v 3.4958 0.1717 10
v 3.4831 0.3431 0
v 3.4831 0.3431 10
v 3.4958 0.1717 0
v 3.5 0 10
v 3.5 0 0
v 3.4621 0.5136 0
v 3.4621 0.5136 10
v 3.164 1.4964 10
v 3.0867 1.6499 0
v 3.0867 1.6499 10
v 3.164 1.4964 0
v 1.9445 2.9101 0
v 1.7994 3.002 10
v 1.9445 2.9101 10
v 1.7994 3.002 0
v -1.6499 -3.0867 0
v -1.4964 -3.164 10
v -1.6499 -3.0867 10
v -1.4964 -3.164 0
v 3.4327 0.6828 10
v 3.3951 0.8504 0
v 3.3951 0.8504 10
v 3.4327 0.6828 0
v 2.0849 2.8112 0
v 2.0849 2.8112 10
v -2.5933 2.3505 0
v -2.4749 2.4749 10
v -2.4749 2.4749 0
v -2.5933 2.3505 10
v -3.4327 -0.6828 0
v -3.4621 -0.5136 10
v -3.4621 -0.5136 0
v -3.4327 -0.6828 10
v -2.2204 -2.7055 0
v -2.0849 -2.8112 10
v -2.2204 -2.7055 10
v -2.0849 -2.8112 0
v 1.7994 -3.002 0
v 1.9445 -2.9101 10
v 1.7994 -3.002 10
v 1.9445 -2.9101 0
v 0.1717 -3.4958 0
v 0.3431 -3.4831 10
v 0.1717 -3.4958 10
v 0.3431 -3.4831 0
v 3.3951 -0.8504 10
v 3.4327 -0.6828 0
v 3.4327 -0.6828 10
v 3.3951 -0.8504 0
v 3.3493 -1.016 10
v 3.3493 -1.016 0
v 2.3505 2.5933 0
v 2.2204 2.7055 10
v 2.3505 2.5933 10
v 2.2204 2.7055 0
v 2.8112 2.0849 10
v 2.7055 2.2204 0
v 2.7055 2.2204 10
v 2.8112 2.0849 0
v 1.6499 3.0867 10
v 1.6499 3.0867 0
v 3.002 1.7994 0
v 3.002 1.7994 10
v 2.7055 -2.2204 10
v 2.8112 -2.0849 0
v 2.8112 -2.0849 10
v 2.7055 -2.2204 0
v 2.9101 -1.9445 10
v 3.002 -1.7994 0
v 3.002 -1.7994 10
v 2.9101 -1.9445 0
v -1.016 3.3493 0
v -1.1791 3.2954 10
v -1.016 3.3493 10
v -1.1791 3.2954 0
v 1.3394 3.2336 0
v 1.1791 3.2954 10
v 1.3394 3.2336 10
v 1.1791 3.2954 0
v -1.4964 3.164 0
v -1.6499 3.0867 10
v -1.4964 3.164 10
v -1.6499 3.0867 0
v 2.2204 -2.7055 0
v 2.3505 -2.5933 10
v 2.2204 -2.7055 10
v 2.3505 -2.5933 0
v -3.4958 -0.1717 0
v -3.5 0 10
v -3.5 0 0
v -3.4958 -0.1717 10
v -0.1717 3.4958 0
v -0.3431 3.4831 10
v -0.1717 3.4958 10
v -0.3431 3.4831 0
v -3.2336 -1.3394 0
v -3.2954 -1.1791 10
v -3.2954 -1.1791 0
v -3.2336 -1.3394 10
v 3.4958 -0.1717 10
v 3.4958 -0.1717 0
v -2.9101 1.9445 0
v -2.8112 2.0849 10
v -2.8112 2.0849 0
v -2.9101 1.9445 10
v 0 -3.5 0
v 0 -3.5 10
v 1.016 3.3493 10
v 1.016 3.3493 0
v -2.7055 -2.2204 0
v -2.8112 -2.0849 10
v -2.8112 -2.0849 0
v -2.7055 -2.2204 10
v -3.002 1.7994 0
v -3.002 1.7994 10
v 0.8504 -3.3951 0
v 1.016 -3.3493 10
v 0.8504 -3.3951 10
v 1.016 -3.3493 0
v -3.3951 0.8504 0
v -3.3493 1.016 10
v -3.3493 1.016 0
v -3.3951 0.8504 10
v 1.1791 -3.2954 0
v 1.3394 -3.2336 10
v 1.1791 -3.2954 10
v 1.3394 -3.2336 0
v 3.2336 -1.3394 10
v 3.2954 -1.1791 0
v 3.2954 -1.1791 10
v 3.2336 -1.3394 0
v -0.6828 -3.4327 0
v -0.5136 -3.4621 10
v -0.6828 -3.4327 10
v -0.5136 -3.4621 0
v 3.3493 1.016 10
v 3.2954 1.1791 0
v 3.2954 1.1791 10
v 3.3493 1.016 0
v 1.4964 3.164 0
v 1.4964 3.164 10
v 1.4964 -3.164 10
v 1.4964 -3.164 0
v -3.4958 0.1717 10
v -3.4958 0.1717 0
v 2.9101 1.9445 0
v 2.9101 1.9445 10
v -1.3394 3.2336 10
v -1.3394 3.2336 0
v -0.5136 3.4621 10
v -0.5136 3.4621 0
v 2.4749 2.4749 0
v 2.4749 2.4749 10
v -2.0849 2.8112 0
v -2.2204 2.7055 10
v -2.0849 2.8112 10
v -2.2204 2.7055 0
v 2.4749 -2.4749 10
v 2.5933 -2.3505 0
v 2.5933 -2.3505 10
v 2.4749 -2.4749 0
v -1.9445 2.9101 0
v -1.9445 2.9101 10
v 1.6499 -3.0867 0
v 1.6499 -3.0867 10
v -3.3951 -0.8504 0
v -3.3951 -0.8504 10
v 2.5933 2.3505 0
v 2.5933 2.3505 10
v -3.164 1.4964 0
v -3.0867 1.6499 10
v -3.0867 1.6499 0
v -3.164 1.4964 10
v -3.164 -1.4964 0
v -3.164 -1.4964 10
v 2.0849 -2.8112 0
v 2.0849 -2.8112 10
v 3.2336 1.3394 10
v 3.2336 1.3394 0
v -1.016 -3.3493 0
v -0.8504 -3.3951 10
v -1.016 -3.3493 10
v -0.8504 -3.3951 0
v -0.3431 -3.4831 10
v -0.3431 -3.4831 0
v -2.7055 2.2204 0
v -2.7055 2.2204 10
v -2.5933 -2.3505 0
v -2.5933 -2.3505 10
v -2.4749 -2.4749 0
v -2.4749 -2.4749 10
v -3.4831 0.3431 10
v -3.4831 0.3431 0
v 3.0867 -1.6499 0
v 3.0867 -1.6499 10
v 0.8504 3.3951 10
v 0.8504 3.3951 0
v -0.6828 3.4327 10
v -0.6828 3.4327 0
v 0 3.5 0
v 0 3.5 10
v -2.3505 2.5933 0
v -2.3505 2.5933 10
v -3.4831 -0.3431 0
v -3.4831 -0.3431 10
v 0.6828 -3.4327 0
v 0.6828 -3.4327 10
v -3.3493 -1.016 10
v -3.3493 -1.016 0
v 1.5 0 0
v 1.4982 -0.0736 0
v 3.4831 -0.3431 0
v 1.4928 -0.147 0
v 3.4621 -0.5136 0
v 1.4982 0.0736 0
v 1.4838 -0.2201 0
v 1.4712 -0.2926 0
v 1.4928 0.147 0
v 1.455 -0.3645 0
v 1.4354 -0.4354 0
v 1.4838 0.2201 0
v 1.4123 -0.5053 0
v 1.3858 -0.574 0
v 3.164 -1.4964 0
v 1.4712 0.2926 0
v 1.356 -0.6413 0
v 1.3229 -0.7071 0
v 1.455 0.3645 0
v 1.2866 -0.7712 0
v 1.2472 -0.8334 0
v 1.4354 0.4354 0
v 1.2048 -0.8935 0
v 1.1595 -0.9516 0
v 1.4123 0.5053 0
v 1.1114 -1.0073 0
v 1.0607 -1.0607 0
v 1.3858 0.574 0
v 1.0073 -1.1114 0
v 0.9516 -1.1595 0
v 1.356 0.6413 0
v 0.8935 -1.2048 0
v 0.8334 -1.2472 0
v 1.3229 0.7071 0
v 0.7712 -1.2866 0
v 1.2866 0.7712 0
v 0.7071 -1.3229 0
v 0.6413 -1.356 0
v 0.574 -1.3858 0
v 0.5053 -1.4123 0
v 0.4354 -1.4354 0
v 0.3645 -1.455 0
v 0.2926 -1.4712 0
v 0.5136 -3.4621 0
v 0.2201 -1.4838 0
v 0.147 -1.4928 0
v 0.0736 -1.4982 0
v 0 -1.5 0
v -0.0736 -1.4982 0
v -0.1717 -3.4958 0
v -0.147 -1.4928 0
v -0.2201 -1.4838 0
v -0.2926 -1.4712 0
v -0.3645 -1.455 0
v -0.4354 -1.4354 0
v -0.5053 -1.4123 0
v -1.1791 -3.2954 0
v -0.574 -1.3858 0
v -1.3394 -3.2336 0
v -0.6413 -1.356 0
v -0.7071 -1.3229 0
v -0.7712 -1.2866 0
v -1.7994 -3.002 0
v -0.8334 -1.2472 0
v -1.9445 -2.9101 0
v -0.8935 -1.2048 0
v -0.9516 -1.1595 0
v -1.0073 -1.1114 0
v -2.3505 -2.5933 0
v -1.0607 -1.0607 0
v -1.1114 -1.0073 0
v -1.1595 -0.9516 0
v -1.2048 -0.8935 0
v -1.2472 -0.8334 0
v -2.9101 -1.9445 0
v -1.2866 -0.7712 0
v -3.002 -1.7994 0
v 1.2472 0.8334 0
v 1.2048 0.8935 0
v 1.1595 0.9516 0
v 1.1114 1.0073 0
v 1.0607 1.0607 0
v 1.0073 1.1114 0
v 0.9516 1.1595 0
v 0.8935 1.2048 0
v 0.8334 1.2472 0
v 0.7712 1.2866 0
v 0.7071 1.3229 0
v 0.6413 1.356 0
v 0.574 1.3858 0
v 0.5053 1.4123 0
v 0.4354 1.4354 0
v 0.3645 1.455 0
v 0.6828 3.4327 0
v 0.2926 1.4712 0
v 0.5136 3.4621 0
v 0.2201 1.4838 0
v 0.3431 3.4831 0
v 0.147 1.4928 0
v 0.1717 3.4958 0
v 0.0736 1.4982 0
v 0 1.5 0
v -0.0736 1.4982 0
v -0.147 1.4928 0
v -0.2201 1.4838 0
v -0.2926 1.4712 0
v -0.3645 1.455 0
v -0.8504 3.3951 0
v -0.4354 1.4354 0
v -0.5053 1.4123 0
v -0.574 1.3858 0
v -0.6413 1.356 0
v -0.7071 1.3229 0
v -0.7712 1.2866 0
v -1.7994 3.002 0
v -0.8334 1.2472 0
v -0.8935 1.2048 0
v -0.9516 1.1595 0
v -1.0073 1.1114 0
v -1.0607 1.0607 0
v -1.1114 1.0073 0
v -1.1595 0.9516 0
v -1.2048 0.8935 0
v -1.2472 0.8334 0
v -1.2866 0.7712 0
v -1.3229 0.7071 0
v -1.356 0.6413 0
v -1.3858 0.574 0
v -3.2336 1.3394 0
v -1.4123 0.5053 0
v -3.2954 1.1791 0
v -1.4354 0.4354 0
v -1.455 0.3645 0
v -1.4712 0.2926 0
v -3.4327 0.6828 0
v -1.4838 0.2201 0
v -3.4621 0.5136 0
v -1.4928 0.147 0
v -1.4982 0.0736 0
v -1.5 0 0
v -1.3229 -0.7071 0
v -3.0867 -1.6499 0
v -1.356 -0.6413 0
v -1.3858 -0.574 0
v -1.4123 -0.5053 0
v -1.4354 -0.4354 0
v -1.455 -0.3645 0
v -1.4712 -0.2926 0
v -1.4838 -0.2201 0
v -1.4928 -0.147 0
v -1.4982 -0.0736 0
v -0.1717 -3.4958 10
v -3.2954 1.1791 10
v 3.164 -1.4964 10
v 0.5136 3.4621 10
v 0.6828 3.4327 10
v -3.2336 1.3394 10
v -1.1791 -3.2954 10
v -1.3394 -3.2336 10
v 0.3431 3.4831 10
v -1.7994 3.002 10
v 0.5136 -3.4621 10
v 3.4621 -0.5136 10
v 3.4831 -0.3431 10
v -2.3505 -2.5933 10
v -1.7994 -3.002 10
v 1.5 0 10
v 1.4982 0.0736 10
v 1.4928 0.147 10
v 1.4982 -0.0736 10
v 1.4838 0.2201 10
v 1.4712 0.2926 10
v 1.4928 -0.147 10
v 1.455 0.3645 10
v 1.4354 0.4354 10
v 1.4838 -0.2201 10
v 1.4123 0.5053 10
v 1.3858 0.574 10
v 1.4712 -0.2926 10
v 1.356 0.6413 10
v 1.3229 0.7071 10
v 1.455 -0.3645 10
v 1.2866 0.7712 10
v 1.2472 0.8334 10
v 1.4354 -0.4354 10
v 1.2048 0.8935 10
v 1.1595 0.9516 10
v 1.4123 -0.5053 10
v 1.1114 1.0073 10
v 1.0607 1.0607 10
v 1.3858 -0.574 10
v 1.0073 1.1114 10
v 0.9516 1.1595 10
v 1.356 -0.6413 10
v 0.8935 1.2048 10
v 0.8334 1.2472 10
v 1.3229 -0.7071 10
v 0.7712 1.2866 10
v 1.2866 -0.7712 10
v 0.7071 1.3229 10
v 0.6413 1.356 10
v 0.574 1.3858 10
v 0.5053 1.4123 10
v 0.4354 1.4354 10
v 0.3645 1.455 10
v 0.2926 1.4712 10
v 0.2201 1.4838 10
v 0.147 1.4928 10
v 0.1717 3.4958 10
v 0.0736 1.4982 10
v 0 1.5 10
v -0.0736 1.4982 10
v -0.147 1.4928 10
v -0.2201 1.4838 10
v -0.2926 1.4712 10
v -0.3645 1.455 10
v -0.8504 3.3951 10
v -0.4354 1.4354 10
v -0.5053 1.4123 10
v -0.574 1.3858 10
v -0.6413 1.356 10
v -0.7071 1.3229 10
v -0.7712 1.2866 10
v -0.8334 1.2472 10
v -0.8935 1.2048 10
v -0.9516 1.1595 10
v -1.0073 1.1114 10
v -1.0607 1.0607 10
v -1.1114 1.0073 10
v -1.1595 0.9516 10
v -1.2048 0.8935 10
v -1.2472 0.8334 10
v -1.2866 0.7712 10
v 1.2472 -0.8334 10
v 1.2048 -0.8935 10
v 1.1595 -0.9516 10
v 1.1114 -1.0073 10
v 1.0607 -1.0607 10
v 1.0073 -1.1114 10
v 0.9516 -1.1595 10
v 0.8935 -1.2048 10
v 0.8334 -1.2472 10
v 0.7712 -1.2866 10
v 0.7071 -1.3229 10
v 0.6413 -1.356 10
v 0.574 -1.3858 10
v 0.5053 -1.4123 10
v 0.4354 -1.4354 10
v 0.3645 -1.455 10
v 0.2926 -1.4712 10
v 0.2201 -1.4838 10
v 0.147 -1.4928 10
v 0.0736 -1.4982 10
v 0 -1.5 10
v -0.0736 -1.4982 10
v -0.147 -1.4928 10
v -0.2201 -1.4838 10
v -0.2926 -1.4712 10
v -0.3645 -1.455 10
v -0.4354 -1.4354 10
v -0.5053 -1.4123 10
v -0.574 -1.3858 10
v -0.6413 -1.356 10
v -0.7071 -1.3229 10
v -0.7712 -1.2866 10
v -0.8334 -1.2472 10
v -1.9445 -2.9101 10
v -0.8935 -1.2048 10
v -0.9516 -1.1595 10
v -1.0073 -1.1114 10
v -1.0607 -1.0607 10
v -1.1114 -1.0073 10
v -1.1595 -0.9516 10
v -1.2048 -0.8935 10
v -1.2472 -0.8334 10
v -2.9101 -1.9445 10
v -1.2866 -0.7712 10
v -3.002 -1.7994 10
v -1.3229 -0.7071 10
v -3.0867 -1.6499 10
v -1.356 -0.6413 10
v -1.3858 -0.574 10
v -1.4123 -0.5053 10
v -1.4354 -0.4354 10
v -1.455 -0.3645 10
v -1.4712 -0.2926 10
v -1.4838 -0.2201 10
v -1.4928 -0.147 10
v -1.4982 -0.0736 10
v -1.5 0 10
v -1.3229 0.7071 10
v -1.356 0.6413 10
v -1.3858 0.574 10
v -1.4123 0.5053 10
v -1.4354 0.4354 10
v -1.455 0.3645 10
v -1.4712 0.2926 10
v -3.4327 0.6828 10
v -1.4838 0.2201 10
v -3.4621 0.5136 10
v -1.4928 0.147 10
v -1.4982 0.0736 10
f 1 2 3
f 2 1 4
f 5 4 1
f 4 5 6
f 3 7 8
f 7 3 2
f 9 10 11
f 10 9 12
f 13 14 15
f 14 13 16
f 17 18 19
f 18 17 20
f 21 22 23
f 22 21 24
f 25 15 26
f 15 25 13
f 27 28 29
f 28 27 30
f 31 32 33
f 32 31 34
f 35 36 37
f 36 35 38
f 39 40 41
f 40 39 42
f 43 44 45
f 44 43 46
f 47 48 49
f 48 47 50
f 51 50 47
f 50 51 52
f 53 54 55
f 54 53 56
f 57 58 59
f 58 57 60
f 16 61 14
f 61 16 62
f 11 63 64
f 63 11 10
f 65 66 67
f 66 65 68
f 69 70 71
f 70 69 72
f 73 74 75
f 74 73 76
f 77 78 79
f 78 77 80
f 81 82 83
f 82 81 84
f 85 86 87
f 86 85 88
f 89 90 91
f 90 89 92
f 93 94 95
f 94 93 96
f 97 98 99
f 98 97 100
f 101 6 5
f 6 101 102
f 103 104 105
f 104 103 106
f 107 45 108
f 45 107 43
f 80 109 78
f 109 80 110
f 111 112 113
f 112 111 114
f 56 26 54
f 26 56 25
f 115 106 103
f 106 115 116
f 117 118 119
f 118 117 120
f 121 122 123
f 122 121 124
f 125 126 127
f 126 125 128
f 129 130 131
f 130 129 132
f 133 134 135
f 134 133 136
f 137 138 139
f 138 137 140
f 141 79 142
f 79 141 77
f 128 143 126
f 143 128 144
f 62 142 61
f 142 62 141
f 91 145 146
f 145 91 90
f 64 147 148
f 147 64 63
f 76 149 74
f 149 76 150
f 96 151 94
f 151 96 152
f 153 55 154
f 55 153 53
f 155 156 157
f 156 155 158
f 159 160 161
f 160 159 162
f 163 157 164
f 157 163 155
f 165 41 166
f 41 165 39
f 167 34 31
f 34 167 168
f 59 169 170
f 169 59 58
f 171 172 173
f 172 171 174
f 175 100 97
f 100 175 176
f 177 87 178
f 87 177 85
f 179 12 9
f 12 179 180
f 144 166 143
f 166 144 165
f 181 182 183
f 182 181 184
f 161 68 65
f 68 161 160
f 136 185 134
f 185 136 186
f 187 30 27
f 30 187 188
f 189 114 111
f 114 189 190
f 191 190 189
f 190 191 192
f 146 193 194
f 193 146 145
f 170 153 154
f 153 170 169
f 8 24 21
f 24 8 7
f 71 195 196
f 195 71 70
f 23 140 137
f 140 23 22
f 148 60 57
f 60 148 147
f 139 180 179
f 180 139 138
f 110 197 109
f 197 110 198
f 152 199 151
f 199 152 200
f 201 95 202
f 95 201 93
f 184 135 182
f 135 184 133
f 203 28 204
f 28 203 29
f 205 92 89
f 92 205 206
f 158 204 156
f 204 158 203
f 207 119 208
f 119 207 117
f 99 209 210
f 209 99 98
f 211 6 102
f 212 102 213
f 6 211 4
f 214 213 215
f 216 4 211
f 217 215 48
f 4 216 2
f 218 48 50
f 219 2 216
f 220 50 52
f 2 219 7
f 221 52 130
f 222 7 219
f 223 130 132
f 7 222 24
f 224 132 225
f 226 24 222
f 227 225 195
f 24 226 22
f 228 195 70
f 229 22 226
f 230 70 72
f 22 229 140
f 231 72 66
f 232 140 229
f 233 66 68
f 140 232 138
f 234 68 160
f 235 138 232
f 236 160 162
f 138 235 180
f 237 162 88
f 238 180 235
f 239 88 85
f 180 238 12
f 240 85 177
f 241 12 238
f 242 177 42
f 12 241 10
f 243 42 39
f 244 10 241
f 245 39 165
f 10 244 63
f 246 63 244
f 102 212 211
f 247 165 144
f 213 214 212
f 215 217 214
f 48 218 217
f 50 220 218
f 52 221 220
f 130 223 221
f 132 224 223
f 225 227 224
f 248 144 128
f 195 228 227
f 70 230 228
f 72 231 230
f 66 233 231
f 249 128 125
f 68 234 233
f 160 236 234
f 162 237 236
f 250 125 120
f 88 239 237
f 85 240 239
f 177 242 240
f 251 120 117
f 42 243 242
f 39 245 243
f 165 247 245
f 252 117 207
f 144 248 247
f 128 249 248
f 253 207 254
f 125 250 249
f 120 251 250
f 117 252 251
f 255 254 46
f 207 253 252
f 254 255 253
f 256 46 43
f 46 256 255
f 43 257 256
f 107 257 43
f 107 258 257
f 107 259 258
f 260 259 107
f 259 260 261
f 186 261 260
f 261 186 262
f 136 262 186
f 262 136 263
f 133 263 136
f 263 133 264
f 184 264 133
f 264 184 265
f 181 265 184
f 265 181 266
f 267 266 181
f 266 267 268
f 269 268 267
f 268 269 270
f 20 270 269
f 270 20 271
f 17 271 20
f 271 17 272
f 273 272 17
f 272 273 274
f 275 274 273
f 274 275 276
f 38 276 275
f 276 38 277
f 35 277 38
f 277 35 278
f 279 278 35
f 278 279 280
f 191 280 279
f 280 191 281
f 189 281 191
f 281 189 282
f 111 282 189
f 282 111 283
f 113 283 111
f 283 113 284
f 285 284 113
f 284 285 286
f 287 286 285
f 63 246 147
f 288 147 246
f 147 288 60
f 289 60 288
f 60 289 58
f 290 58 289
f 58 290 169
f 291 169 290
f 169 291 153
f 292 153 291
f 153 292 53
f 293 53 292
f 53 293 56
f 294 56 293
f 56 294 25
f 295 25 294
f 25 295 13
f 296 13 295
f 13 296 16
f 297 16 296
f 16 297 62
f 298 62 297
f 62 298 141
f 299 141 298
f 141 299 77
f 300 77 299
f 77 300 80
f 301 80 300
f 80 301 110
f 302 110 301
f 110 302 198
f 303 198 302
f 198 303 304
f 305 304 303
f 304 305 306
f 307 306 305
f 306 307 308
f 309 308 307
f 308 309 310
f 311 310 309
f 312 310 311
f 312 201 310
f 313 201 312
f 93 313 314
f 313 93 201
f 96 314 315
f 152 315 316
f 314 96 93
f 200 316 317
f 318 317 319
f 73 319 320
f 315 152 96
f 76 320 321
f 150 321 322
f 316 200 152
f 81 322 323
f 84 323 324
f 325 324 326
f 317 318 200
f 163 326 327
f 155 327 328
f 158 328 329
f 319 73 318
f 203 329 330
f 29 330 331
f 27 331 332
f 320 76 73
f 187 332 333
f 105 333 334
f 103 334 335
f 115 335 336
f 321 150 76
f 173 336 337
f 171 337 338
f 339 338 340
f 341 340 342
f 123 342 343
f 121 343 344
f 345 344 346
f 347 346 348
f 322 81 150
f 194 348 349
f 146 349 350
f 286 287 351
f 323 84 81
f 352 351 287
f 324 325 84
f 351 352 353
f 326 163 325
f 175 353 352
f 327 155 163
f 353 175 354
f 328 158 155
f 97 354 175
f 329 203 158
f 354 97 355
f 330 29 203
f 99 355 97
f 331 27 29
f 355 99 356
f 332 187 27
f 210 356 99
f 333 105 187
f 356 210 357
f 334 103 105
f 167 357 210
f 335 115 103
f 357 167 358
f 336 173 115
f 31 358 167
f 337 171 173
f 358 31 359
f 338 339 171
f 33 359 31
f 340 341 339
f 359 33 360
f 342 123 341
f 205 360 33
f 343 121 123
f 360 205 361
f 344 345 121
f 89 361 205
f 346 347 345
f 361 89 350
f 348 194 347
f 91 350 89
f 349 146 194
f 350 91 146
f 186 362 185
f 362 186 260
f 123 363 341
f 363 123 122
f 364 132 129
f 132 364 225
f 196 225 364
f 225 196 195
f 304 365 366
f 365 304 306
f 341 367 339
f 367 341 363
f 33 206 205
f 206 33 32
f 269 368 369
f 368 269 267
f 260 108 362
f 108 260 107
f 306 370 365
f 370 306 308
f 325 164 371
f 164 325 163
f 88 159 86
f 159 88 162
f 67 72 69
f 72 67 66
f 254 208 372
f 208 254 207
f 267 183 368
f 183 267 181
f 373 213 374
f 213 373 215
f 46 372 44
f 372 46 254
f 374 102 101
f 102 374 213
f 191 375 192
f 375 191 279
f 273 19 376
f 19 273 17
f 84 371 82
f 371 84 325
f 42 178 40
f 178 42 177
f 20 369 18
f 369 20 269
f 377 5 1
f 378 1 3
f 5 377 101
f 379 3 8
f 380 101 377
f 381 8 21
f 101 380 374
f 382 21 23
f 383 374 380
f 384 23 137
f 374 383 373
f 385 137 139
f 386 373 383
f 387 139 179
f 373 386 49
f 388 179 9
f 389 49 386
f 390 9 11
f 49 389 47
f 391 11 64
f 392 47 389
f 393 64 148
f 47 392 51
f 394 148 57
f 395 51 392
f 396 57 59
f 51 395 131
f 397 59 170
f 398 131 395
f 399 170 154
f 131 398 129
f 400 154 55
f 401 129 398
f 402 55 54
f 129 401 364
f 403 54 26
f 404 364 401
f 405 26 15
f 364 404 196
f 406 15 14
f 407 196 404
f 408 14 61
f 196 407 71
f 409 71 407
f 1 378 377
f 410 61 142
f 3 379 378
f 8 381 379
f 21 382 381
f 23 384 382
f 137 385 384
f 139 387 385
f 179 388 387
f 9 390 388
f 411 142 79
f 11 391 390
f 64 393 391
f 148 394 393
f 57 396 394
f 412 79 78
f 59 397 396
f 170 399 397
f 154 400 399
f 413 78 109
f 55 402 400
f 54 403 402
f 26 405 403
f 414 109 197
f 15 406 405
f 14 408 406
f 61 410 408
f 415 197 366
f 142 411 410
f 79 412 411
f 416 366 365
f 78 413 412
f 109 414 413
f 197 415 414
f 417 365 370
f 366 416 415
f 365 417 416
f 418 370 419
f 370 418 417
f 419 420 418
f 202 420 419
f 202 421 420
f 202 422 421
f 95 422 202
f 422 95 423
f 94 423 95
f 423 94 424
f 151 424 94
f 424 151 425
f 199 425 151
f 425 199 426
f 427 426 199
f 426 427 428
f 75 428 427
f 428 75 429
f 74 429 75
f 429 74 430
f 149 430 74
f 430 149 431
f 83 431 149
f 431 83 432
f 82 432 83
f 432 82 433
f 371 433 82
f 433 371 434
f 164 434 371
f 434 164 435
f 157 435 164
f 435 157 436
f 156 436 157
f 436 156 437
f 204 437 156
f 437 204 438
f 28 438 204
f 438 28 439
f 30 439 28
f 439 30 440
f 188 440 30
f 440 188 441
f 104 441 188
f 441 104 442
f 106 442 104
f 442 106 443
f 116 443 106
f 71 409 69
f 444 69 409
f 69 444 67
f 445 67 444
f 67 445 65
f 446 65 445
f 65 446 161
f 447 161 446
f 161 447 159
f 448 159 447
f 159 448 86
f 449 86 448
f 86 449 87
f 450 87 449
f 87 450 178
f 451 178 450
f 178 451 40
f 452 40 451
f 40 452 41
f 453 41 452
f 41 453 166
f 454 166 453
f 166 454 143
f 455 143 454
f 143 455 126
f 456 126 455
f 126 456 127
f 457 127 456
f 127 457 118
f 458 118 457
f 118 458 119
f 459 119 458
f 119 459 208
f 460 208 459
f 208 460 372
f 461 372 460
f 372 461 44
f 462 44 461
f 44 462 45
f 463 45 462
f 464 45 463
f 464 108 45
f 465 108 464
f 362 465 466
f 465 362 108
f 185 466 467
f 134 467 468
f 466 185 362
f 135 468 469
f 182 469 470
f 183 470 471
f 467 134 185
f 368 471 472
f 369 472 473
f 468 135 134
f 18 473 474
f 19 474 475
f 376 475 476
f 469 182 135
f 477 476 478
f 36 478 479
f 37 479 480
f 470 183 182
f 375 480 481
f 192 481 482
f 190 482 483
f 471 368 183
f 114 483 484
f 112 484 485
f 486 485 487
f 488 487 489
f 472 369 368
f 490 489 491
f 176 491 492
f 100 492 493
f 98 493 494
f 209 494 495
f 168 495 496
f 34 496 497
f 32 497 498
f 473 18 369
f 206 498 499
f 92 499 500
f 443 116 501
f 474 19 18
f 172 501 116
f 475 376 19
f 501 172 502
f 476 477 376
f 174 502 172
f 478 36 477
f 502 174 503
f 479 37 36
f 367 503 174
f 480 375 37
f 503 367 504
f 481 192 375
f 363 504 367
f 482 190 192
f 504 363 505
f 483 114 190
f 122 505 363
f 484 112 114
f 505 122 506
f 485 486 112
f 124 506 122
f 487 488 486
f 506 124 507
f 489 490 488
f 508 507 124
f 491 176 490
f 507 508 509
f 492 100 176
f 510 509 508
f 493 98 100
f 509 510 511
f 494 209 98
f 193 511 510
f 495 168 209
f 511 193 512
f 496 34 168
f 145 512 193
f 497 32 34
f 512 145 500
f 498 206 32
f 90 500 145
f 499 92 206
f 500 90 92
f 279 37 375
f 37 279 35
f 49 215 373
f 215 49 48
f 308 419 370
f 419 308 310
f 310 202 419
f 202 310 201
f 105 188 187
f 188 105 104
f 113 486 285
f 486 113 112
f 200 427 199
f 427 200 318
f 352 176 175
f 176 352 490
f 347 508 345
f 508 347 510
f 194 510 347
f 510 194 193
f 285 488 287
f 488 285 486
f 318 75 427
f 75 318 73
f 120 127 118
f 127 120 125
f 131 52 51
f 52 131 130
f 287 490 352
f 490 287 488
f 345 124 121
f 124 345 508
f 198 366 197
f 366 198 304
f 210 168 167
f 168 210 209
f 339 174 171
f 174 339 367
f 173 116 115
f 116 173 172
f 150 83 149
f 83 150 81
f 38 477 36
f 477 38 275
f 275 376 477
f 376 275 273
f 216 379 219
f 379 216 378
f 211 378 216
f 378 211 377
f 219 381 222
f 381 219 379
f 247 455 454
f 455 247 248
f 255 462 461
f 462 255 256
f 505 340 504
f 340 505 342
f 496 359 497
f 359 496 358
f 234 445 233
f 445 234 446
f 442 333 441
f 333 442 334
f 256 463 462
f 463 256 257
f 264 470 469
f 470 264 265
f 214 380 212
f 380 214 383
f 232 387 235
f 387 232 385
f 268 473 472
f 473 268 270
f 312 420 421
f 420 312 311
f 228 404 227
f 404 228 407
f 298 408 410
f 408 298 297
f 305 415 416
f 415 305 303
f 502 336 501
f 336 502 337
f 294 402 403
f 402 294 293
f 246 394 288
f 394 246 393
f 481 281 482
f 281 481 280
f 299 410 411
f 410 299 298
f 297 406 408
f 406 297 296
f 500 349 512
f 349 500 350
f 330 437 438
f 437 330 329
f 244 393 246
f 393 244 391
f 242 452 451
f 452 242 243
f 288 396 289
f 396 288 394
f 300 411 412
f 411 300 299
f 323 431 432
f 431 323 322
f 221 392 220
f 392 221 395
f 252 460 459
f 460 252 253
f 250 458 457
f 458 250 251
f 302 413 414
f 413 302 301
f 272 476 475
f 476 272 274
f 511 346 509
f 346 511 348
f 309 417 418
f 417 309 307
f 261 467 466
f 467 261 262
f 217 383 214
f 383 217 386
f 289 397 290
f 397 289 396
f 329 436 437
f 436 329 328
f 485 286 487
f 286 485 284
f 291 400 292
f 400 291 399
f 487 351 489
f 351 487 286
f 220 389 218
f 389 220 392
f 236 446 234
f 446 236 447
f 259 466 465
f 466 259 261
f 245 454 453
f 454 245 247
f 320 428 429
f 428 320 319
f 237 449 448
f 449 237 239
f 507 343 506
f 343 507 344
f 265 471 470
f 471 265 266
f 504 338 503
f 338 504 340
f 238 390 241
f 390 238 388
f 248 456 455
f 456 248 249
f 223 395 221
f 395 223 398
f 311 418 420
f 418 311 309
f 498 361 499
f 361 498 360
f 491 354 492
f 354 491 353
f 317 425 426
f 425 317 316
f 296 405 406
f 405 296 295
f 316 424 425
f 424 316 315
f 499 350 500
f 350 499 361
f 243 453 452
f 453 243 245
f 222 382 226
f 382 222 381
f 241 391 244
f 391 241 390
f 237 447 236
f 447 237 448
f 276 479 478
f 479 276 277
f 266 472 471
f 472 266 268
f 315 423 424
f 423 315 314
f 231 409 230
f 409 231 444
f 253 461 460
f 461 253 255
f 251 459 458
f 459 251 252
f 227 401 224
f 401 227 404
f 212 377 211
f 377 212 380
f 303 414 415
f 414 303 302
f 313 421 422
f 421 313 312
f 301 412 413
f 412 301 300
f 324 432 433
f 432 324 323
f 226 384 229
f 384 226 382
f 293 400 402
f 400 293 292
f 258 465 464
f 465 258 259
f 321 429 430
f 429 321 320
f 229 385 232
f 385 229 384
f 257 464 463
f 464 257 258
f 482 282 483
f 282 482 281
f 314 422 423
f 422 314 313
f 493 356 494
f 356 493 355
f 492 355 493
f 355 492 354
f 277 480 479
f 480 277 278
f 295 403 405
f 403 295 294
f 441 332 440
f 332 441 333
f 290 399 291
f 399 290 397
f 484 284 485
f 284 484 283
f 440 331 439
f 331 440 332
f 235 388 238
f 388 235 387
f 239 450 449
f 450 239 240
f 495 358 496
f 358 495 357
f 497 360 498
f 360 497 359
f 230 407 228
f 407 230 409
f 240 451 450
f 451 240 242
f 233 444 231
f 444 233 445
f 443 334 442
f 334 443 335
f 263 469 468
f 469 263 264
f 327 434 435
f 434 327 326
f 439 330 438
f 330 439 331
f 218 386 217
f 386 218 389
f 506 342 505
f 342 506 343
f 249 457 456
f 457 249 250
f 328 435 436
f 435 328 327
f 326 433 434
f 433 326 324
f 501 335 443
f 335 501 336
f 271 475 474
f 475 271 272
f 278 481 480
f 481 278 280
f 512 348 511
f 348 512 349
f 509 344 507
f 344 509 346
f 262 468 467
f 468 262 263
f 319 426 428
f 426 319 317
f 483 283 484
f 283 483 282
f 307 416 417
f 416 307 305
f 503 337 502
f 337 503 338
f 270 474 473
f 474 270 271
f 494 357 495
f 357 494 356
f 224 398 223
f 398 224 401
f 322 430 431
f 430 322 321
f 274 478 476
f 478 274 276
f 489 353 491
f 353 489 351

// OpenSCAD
$fn = 128;

bore_d = 3.0;
od_d   = 7.0;
len    = 10.0;

difference() {
  cylinder(d = od_d, h = len, center = false);
  translate([0,0,-0.01]) cylinder(d = bore_d, h = len + 0.02, center = false);
}
